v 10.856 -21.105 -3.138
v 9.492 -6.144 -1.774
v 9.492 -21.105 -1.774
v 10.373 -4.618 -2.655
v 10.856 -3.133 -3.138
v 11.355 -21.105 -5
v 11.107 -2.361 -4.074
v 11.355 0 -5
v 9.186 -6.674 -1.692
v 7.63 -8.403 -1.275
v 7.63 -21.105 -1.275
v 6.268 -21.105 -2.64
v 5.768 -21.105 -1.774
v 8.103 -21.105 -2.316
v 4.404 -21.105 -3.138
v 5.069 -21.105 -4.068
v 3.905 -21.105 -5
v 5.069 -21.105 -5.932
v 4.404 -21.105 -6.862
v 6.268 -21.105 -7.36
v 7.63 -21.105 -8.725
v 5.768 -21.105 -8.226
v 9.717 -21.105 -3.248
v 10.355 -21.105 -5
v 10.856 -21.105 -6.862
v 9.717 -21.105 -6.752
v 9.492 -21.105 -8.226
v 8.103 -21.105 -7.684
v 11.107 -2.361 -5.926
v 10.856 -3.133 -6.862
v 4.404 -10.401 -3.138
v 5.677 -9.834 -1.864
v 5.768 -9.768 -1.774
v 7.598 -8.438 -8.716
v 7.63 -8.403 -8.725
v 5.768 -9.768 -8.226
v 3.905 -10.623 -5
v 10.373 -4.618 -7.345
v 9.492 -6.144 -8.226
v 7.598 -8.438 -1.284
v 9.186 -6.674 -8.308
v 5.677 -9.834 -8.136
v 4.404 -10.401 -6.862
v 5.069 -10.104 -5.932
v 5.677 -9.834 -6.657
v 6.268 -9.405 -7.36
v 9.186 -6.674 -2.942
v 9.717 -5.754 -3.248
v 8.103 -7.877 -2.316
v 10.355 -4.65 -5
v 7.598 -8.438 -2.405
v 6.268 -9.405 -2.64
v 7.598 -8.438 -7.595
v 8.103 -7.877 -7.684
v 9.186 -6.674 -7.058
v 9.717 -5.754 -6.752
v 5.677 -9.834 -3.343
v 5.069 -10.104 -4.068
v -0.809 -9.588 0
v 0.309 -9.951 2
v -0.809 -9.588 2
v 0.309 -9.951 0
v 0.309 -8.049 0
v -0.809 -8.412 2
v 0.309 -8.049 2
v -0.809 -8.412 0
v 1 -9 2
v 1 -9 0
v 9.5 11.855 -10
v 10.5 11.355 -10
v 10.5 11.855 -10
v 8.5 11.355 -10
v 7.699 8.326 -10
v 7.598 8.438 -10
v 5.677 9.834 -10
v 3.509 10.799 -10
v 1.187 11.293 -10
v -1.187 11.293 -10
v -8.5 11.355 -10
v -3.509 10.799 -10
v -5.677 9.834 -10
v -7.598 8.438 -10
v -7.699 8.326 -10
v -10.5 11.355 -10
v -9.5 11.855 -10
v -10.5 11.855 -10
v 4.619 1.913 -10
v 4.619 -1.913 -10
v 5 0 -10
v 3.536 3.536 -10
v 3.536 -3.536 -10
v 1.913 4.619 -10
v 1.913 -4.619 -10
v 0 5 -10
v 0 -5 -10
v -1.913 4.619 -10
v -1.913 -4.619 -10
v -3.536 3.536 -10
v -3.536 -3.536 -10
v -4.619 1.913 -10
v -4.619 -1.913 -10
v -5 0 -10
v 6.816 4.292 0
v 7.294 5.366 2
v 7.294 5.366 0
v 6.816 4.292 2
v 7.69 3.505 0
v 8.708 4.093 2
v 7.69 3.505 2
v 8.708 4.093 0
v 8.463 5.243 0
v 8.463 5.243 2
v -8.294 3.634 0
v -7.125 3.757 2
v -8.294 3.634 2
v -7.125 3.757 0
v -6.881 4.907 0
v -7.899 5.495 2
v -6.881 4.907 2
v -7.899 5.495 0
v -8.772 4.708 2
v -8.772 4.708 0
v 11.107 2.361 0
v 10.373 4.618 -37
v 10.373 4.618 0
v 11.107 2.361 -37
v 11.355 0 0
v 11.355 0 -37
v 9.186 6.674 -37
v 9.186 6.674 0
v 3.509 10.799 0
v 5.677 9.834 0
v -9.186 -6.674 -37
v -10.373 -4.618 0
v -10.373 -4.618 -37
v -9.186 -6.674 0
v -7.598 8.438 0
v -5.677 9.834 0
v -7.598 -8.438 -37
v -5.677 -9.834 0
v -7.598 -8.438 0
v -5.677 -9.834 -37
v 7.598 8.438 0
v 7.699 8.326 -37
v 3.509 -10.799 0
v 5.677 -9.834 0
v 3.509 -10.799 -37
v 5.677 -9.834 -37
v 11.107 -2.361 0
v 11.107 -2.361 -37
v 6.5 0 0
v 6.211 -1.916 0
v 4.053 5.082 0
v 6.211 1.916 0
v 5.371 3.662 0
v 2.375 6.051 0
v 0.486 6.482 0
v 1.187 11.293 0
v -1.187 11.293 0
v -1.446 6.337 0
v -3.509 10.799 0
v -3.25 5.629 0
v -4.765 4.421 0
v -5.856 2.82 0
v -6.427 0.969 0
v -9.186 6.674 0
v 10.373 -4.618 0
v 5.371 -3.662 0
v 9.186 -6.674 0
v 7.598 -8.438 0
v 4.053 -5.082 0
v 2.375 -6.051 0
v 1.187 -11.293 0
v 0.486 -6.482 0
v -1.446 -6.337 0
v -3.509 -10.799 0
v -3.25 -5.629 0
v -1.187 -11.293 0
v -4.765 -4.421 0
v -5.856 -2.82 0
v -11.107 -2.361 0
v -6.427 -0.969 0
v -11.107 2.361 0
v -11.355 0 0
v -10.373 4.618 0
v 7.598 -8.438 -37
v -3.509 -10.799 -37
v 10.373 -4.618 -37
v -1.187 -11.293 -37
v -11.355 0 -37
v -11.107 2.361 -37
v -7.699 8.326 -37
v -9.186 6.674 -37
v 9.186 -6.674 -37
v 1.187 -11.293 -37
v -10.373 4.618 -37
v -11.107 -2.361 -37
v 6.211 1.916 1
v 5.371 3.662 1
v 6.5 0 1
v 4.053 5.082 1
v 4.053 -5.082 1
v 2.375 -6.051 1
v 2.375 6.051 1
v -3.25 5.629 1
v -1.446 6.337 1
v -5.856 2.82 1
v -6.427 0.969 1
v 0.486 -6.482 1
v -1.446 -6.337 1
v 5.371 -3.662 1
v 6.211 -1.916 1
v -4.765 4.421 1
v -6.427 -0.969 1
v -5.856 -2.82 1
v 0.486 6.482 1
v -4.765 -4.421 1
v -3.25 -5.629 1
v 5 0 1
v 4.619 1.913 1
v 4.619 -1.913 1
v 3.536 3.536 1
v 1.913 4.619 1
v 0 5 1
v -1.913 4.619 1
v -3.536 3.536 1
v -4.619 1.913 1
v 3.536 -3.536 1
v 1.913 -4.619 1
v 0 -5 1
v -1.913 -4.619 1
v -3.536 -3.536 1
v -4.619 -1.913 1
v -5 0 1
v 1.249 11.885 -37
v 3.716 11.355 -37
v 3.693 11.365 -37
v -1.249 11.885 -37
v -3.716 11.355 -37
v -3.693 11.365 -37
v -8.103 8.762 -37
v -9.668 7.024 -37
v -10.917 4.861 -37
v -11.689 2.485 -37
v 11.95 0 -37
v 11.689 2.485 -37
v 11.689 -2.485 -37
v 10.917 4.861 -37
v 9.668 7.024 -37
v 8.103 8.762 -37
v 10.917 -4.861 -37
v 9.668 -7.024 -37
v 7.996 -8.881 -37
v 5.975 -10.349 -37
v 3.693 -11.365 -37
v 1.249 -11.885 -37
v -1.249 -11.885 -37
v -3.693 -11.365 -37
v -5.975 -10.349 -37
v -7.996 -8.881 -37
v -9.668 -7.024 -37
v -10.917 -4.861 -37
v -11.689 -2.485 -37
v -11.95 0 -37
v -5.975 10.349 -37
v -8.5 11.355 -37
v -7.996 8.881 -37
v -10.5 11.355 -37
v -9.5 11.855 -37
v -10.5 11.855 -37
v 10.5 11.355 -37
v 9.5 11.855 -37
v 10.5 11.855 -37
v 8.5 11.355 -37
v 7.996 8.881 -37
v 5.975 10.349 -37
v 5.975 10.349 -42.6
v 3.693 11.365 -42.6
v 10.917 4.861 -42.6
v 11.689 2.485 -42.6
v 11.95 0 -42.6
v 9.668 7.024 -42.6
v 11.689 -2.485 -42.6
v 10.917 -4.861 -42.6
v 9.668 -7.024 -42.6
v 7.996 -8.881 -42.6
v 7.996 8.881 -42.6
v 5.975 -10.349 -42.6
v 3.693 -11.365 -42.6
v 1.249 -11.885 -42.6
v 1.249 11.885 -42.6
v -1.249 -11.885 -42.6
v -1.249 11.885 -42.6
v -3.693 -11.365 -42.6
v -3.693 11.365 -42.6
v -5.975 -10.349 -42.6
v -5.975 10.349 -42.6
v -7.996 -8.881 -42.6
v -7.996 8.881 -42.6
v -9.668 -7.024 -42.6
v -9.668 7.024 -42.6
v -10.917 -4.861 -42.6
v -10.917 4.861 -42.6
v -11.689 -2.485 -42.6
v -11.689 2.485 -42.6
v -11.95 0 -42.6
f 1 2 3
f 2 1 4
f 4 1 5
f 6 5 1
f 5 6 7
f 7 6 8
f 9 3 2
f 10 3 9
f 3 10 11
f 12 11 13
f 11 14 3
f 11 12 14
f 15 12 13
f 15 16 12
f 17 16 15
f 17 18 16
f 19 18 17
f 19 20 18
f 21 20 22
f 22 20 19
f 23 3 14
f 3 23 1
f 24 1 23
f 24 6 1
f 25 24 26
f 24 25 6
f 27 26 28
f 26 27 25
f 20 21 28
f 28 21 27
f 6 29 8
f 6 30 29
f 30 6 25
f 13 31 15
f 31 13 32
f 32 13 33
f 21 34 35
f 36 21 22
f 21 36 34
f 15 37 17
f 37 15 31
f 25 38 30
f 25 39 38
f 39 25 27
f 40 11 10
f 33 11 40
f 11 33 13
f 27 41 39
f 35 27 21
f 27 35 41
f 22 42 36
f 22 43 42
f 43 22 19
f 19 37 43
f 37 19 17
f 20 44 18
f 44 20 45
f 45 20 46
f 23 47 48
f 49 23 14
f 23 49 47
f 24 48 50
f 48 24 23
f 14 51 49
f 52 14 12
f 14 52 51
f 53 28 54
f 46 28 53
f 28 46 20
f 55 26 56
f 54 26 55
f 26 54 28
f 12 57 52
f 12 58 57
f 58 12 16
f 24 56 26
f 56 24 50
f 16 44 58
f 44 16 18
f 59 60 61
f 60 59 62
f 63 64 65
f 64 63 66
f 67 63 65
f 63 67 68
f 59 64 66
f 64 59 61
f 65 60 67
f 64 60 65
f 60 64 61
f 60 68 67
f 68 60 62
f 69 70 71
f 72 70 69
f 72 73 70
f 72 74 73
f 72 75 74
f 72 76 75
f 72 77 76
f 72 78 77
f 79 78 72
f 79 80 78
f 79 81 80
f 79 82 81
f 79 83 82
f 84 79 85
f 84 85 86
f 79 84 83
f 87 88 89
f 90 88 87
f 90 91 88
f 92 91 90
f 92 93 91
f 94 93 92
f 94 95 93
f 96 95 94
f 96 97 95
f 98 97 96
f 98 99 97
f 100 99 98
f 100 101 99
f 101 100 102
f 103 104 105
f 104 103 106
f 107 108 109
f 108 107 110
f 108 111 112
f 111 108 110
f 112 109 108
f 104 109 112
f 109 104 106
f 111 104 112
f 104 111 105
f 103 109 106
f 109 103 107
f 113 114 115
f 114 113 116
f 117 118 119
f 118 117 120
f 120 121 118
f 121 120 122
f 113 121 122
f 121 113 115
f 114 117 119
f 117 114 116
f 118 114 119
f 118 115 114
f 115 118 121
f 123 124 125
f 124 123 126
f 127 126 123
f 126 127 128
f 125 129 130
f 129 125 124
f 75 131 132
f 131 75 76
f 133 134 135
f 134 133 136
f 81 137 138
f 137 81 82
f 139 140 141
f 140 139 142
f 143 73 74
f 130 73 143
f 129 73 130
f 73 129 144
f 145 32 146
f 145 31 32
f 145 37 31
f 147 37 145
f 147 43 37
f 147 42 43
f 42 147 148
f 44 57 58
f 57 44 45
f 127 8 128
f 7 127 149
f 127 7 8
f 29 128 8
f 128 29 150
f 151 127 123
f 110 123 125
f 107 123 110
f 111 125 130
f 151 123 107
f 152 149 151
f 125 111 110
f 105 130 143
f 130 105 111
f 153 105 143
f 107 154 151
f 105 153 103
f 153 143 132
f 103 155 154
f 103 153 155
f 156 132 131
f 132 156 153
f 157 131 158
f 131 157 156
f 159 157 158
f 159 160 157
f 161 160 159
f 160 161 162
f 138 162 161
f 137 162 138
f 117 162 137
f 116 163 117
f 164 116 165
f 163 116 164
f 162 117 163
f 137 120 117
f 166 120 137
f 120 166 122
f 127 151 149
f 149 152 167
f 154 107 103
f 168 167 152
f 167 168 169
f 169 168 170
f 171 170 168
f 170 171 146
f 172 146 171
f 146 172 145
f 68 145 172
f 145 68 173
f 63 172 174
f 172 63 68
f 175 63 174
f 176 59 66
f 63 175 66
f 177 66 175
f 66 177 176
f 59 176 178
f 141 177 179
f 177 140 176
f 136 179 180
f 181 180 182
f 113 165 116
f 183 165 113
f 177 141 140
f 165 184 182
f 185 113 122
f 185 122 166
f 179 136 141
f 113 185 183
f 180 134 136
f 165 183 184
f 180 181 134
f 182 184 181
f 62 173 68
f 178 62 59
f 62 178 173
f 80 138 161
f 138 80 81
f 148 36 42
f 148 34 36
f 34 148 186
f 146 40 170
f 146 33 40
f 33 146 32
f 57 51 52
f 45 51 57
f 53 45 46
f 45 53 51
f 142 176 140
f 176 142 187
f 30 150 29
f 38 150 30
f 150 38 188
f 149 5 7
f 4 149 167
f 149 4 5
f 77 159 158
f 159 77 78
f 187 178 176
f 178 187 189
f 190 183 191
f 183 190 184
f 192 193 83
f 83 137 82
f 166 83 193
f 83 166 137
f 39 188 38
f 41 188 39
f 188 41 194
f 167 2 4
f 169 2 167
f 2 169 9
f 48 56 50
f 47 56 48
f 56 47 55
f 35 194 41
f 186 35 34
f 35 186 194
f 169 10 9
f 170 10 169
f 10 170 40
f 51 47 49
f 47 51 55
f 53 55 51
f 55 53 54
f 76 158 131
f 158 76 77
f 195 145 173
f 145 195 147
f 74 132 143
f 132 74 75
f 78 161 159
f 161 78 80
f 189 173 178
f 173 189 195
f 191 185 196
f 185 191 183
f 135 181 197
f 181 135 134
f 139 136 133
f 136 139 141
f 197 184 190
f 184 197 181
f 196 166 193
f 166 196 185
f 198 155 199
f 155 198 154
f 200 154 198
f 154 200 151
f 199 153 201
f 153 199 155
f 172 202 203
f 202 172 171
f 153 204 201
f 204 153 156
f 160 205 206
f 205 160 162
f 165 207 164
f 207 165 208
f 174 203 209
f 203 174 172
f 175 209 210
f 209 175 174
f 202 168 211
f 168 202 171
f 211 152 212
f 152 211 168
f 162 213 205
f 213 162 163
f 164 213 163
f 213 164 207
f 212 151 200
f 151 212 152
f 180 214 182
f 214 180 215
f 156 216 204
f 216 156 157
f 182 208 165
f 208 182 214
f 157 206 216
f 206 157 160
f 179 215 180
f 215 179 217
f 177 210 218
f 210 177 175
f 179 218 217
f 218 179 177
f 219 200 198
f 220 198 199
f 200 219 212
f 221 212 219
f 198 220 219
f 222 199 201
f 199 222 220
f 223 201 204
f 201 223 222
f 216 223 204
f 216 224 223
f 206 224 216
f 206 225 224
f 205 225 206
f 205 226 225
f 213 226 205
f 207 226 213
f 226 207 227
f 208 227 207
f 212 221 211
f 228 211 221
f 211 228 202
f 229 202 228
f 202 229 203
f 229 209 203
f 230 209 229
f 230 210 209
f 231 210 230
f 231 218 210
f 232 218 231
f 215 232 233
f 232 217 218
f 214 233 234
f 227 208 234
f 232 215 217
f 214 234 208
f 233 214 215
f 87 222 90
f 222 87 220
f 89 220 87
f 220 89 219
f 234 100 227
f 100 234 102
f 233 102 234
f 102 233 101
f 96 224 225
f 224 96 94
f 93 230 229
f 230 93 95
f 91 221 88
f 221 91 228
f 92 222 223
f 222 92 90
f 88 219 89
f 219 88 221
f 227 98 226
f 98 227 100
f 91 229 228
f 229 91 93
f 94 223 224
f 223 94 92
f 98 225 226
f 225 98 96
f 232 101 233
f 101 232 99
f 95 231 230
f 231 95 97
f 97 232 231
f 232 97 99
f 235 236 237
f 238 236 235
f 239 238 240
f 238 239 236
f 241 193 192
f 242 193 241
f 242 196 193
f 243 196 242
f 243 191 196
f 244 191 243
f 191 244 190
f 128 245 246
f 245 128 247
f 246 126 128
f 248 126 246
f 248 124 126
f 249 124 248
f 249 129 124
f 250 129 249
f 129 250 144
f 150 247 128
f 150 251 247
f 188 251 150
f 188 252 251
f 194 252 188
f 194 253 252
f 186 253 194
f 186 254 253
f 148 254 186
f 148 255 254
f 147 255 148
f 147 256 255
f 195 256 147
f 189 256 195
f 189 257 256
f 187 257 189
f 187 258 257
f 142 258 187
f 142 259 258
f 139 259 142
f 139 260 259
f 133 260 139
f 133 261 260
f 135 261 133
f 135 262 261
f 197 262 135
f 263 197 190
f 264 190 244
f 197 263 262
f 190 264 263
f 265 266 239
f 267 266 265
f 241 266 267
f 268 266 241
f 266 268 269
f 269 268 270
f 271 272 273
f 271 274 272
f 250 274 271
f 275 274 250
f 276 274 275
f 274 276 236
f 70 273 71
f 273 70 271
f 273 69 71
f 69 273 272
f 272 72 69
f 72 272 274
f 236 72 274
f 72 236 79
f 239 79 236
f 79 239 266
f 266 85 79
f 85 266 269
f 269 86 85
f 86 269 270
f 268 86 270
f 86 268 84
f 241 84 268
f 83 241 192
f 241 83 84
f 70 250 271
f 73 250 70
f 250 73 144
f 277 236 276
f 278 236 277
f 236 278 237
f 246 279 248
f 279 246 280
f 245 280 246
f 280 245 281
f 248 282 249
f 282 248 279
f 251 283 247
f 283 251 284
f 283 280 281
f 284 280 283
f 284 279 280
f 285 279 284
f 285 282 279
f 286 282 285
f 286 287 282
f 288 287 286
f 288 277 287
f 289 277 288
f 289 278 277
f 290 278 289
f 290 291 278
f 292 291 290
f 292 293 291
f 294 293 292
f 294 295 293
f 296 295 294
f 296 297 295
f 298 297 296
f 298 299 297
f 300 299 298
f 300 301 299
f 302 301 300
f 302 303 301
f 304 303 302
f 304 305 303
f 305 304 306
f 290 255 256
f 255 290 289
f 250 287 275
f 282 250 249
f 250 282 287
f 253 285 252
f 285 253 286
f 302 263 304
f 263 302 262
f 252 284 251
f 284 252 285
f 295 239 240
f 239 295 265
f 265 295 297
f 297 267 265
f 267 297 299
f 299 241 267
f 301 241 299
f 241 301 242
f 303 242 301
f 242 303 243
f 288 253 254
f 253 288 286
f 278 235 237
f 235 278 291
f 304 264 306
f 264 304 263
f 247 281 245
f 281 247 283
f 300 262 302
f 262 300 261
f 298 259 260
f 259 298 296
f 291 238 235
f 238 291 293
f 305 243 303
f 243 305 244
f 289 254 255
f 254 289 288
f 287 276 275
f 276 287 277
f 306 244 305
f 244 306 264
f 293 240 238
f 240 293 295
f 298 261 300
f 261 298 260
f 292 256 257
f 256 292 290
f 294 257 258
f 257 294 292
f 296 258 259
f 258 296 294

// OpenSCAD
function pump_4547_pump_diameter() = 22.71;
function pump_4547_foot_width() = 21;

// Submersible 3V DC Water Pump - 1 Meter Vertical Type, Adafruit 4547
// https://www.adafruit.com/product/4547
// JT-DC3W-3
// The component body has three main parts:
// - pump: a 10mm long housing with a fan attached to the motor shaft. The pump has a port meant to attach a hose
// - motor: a 27mm long housing containing a DC motor. The motor has a foot meant to slide into a slot for mounting
// - end: a short section covering the electrical connection on the back of the motor
module pump_4547() {
    pump_length=10;
    intake_diameter=10;
    lip_height=1;
    lip_diameter=13;
    alignment_offset=9;
    alignment_diameter=2;
    alignment_height=2;
    port_diameter=7.45;
    port_inner_diameter=port_diameter-2;
    port_height=9.75;
    motor_diameter=22.71;
    motor_length=27;
    end_length=42.6-motor_length-pump_length;
    end_diameter=23.9;

    translate([0,0,-pump_length]) union() {
        // pump
        difference() {
            union() {
                // pump body
                cylinder(h=pump_length, d=pump_4547_pump_diameter());
                
                // pump port
                translate([pump_4547_pump_diameter()/2-port_diameter/2,0,pump_length/2]) rotate([90,0,0]) difference() {
                    cylinder(h=port_height+pump_4547_pump_diameter()/2, d=port_diameter);
                    cylinder(h=port_height+pump_4547_pump_diameter()/2, d=port_inner_diameter);
                }
                
                // pump intake lip
                cylinder(h=pump_length+lip_height, d=lip_diameter);
                
                // alignment points
                for(t=[0:360/3:360]) rotate([0,0,t]) translate([0,-alignment_offset,0]) cylinder(h=pump_length+alignment_height, d=alignment_diameter);
            }
            
            // pump intake
            cylinder(h=pump_length+lip_height, d=intake_diameter);
        }
        
        // motor
        translate([0,0,-motor_length]) {
            cylinder(h=motor_length, d=motor_diameter);
            linear_extrude(motor_length) polygon([
            [-pump_4547_foot_width()/2+2,motor_diameter/2],
            [-pump_4547_foot_width()/2+1,motor_diameter/2+0.5],
            [-pump_4547_foot_width()/2,motor_diameter/2+0.5],
            [-pump_4547_foot_width()/2,motor_diameter/2],
            [0,0],
            [pump_4547_foot_width()/2,motor_diameter/2],
            [pump_4547_foot_width()/2,motor_diameter/2+0.5],
            [pump_4547_foot_width()/2-1,motor_diameter/2+0.5],        [pump_4547_foot_width()/2-2,motor_diameter/2]
            ]);
        }

        // end
        translate([0,0,-end_length-motor_length]) {
            cylinder(h=end_length, d=end_diameter);
        }
    }
}

color("beige") pump_4547();
